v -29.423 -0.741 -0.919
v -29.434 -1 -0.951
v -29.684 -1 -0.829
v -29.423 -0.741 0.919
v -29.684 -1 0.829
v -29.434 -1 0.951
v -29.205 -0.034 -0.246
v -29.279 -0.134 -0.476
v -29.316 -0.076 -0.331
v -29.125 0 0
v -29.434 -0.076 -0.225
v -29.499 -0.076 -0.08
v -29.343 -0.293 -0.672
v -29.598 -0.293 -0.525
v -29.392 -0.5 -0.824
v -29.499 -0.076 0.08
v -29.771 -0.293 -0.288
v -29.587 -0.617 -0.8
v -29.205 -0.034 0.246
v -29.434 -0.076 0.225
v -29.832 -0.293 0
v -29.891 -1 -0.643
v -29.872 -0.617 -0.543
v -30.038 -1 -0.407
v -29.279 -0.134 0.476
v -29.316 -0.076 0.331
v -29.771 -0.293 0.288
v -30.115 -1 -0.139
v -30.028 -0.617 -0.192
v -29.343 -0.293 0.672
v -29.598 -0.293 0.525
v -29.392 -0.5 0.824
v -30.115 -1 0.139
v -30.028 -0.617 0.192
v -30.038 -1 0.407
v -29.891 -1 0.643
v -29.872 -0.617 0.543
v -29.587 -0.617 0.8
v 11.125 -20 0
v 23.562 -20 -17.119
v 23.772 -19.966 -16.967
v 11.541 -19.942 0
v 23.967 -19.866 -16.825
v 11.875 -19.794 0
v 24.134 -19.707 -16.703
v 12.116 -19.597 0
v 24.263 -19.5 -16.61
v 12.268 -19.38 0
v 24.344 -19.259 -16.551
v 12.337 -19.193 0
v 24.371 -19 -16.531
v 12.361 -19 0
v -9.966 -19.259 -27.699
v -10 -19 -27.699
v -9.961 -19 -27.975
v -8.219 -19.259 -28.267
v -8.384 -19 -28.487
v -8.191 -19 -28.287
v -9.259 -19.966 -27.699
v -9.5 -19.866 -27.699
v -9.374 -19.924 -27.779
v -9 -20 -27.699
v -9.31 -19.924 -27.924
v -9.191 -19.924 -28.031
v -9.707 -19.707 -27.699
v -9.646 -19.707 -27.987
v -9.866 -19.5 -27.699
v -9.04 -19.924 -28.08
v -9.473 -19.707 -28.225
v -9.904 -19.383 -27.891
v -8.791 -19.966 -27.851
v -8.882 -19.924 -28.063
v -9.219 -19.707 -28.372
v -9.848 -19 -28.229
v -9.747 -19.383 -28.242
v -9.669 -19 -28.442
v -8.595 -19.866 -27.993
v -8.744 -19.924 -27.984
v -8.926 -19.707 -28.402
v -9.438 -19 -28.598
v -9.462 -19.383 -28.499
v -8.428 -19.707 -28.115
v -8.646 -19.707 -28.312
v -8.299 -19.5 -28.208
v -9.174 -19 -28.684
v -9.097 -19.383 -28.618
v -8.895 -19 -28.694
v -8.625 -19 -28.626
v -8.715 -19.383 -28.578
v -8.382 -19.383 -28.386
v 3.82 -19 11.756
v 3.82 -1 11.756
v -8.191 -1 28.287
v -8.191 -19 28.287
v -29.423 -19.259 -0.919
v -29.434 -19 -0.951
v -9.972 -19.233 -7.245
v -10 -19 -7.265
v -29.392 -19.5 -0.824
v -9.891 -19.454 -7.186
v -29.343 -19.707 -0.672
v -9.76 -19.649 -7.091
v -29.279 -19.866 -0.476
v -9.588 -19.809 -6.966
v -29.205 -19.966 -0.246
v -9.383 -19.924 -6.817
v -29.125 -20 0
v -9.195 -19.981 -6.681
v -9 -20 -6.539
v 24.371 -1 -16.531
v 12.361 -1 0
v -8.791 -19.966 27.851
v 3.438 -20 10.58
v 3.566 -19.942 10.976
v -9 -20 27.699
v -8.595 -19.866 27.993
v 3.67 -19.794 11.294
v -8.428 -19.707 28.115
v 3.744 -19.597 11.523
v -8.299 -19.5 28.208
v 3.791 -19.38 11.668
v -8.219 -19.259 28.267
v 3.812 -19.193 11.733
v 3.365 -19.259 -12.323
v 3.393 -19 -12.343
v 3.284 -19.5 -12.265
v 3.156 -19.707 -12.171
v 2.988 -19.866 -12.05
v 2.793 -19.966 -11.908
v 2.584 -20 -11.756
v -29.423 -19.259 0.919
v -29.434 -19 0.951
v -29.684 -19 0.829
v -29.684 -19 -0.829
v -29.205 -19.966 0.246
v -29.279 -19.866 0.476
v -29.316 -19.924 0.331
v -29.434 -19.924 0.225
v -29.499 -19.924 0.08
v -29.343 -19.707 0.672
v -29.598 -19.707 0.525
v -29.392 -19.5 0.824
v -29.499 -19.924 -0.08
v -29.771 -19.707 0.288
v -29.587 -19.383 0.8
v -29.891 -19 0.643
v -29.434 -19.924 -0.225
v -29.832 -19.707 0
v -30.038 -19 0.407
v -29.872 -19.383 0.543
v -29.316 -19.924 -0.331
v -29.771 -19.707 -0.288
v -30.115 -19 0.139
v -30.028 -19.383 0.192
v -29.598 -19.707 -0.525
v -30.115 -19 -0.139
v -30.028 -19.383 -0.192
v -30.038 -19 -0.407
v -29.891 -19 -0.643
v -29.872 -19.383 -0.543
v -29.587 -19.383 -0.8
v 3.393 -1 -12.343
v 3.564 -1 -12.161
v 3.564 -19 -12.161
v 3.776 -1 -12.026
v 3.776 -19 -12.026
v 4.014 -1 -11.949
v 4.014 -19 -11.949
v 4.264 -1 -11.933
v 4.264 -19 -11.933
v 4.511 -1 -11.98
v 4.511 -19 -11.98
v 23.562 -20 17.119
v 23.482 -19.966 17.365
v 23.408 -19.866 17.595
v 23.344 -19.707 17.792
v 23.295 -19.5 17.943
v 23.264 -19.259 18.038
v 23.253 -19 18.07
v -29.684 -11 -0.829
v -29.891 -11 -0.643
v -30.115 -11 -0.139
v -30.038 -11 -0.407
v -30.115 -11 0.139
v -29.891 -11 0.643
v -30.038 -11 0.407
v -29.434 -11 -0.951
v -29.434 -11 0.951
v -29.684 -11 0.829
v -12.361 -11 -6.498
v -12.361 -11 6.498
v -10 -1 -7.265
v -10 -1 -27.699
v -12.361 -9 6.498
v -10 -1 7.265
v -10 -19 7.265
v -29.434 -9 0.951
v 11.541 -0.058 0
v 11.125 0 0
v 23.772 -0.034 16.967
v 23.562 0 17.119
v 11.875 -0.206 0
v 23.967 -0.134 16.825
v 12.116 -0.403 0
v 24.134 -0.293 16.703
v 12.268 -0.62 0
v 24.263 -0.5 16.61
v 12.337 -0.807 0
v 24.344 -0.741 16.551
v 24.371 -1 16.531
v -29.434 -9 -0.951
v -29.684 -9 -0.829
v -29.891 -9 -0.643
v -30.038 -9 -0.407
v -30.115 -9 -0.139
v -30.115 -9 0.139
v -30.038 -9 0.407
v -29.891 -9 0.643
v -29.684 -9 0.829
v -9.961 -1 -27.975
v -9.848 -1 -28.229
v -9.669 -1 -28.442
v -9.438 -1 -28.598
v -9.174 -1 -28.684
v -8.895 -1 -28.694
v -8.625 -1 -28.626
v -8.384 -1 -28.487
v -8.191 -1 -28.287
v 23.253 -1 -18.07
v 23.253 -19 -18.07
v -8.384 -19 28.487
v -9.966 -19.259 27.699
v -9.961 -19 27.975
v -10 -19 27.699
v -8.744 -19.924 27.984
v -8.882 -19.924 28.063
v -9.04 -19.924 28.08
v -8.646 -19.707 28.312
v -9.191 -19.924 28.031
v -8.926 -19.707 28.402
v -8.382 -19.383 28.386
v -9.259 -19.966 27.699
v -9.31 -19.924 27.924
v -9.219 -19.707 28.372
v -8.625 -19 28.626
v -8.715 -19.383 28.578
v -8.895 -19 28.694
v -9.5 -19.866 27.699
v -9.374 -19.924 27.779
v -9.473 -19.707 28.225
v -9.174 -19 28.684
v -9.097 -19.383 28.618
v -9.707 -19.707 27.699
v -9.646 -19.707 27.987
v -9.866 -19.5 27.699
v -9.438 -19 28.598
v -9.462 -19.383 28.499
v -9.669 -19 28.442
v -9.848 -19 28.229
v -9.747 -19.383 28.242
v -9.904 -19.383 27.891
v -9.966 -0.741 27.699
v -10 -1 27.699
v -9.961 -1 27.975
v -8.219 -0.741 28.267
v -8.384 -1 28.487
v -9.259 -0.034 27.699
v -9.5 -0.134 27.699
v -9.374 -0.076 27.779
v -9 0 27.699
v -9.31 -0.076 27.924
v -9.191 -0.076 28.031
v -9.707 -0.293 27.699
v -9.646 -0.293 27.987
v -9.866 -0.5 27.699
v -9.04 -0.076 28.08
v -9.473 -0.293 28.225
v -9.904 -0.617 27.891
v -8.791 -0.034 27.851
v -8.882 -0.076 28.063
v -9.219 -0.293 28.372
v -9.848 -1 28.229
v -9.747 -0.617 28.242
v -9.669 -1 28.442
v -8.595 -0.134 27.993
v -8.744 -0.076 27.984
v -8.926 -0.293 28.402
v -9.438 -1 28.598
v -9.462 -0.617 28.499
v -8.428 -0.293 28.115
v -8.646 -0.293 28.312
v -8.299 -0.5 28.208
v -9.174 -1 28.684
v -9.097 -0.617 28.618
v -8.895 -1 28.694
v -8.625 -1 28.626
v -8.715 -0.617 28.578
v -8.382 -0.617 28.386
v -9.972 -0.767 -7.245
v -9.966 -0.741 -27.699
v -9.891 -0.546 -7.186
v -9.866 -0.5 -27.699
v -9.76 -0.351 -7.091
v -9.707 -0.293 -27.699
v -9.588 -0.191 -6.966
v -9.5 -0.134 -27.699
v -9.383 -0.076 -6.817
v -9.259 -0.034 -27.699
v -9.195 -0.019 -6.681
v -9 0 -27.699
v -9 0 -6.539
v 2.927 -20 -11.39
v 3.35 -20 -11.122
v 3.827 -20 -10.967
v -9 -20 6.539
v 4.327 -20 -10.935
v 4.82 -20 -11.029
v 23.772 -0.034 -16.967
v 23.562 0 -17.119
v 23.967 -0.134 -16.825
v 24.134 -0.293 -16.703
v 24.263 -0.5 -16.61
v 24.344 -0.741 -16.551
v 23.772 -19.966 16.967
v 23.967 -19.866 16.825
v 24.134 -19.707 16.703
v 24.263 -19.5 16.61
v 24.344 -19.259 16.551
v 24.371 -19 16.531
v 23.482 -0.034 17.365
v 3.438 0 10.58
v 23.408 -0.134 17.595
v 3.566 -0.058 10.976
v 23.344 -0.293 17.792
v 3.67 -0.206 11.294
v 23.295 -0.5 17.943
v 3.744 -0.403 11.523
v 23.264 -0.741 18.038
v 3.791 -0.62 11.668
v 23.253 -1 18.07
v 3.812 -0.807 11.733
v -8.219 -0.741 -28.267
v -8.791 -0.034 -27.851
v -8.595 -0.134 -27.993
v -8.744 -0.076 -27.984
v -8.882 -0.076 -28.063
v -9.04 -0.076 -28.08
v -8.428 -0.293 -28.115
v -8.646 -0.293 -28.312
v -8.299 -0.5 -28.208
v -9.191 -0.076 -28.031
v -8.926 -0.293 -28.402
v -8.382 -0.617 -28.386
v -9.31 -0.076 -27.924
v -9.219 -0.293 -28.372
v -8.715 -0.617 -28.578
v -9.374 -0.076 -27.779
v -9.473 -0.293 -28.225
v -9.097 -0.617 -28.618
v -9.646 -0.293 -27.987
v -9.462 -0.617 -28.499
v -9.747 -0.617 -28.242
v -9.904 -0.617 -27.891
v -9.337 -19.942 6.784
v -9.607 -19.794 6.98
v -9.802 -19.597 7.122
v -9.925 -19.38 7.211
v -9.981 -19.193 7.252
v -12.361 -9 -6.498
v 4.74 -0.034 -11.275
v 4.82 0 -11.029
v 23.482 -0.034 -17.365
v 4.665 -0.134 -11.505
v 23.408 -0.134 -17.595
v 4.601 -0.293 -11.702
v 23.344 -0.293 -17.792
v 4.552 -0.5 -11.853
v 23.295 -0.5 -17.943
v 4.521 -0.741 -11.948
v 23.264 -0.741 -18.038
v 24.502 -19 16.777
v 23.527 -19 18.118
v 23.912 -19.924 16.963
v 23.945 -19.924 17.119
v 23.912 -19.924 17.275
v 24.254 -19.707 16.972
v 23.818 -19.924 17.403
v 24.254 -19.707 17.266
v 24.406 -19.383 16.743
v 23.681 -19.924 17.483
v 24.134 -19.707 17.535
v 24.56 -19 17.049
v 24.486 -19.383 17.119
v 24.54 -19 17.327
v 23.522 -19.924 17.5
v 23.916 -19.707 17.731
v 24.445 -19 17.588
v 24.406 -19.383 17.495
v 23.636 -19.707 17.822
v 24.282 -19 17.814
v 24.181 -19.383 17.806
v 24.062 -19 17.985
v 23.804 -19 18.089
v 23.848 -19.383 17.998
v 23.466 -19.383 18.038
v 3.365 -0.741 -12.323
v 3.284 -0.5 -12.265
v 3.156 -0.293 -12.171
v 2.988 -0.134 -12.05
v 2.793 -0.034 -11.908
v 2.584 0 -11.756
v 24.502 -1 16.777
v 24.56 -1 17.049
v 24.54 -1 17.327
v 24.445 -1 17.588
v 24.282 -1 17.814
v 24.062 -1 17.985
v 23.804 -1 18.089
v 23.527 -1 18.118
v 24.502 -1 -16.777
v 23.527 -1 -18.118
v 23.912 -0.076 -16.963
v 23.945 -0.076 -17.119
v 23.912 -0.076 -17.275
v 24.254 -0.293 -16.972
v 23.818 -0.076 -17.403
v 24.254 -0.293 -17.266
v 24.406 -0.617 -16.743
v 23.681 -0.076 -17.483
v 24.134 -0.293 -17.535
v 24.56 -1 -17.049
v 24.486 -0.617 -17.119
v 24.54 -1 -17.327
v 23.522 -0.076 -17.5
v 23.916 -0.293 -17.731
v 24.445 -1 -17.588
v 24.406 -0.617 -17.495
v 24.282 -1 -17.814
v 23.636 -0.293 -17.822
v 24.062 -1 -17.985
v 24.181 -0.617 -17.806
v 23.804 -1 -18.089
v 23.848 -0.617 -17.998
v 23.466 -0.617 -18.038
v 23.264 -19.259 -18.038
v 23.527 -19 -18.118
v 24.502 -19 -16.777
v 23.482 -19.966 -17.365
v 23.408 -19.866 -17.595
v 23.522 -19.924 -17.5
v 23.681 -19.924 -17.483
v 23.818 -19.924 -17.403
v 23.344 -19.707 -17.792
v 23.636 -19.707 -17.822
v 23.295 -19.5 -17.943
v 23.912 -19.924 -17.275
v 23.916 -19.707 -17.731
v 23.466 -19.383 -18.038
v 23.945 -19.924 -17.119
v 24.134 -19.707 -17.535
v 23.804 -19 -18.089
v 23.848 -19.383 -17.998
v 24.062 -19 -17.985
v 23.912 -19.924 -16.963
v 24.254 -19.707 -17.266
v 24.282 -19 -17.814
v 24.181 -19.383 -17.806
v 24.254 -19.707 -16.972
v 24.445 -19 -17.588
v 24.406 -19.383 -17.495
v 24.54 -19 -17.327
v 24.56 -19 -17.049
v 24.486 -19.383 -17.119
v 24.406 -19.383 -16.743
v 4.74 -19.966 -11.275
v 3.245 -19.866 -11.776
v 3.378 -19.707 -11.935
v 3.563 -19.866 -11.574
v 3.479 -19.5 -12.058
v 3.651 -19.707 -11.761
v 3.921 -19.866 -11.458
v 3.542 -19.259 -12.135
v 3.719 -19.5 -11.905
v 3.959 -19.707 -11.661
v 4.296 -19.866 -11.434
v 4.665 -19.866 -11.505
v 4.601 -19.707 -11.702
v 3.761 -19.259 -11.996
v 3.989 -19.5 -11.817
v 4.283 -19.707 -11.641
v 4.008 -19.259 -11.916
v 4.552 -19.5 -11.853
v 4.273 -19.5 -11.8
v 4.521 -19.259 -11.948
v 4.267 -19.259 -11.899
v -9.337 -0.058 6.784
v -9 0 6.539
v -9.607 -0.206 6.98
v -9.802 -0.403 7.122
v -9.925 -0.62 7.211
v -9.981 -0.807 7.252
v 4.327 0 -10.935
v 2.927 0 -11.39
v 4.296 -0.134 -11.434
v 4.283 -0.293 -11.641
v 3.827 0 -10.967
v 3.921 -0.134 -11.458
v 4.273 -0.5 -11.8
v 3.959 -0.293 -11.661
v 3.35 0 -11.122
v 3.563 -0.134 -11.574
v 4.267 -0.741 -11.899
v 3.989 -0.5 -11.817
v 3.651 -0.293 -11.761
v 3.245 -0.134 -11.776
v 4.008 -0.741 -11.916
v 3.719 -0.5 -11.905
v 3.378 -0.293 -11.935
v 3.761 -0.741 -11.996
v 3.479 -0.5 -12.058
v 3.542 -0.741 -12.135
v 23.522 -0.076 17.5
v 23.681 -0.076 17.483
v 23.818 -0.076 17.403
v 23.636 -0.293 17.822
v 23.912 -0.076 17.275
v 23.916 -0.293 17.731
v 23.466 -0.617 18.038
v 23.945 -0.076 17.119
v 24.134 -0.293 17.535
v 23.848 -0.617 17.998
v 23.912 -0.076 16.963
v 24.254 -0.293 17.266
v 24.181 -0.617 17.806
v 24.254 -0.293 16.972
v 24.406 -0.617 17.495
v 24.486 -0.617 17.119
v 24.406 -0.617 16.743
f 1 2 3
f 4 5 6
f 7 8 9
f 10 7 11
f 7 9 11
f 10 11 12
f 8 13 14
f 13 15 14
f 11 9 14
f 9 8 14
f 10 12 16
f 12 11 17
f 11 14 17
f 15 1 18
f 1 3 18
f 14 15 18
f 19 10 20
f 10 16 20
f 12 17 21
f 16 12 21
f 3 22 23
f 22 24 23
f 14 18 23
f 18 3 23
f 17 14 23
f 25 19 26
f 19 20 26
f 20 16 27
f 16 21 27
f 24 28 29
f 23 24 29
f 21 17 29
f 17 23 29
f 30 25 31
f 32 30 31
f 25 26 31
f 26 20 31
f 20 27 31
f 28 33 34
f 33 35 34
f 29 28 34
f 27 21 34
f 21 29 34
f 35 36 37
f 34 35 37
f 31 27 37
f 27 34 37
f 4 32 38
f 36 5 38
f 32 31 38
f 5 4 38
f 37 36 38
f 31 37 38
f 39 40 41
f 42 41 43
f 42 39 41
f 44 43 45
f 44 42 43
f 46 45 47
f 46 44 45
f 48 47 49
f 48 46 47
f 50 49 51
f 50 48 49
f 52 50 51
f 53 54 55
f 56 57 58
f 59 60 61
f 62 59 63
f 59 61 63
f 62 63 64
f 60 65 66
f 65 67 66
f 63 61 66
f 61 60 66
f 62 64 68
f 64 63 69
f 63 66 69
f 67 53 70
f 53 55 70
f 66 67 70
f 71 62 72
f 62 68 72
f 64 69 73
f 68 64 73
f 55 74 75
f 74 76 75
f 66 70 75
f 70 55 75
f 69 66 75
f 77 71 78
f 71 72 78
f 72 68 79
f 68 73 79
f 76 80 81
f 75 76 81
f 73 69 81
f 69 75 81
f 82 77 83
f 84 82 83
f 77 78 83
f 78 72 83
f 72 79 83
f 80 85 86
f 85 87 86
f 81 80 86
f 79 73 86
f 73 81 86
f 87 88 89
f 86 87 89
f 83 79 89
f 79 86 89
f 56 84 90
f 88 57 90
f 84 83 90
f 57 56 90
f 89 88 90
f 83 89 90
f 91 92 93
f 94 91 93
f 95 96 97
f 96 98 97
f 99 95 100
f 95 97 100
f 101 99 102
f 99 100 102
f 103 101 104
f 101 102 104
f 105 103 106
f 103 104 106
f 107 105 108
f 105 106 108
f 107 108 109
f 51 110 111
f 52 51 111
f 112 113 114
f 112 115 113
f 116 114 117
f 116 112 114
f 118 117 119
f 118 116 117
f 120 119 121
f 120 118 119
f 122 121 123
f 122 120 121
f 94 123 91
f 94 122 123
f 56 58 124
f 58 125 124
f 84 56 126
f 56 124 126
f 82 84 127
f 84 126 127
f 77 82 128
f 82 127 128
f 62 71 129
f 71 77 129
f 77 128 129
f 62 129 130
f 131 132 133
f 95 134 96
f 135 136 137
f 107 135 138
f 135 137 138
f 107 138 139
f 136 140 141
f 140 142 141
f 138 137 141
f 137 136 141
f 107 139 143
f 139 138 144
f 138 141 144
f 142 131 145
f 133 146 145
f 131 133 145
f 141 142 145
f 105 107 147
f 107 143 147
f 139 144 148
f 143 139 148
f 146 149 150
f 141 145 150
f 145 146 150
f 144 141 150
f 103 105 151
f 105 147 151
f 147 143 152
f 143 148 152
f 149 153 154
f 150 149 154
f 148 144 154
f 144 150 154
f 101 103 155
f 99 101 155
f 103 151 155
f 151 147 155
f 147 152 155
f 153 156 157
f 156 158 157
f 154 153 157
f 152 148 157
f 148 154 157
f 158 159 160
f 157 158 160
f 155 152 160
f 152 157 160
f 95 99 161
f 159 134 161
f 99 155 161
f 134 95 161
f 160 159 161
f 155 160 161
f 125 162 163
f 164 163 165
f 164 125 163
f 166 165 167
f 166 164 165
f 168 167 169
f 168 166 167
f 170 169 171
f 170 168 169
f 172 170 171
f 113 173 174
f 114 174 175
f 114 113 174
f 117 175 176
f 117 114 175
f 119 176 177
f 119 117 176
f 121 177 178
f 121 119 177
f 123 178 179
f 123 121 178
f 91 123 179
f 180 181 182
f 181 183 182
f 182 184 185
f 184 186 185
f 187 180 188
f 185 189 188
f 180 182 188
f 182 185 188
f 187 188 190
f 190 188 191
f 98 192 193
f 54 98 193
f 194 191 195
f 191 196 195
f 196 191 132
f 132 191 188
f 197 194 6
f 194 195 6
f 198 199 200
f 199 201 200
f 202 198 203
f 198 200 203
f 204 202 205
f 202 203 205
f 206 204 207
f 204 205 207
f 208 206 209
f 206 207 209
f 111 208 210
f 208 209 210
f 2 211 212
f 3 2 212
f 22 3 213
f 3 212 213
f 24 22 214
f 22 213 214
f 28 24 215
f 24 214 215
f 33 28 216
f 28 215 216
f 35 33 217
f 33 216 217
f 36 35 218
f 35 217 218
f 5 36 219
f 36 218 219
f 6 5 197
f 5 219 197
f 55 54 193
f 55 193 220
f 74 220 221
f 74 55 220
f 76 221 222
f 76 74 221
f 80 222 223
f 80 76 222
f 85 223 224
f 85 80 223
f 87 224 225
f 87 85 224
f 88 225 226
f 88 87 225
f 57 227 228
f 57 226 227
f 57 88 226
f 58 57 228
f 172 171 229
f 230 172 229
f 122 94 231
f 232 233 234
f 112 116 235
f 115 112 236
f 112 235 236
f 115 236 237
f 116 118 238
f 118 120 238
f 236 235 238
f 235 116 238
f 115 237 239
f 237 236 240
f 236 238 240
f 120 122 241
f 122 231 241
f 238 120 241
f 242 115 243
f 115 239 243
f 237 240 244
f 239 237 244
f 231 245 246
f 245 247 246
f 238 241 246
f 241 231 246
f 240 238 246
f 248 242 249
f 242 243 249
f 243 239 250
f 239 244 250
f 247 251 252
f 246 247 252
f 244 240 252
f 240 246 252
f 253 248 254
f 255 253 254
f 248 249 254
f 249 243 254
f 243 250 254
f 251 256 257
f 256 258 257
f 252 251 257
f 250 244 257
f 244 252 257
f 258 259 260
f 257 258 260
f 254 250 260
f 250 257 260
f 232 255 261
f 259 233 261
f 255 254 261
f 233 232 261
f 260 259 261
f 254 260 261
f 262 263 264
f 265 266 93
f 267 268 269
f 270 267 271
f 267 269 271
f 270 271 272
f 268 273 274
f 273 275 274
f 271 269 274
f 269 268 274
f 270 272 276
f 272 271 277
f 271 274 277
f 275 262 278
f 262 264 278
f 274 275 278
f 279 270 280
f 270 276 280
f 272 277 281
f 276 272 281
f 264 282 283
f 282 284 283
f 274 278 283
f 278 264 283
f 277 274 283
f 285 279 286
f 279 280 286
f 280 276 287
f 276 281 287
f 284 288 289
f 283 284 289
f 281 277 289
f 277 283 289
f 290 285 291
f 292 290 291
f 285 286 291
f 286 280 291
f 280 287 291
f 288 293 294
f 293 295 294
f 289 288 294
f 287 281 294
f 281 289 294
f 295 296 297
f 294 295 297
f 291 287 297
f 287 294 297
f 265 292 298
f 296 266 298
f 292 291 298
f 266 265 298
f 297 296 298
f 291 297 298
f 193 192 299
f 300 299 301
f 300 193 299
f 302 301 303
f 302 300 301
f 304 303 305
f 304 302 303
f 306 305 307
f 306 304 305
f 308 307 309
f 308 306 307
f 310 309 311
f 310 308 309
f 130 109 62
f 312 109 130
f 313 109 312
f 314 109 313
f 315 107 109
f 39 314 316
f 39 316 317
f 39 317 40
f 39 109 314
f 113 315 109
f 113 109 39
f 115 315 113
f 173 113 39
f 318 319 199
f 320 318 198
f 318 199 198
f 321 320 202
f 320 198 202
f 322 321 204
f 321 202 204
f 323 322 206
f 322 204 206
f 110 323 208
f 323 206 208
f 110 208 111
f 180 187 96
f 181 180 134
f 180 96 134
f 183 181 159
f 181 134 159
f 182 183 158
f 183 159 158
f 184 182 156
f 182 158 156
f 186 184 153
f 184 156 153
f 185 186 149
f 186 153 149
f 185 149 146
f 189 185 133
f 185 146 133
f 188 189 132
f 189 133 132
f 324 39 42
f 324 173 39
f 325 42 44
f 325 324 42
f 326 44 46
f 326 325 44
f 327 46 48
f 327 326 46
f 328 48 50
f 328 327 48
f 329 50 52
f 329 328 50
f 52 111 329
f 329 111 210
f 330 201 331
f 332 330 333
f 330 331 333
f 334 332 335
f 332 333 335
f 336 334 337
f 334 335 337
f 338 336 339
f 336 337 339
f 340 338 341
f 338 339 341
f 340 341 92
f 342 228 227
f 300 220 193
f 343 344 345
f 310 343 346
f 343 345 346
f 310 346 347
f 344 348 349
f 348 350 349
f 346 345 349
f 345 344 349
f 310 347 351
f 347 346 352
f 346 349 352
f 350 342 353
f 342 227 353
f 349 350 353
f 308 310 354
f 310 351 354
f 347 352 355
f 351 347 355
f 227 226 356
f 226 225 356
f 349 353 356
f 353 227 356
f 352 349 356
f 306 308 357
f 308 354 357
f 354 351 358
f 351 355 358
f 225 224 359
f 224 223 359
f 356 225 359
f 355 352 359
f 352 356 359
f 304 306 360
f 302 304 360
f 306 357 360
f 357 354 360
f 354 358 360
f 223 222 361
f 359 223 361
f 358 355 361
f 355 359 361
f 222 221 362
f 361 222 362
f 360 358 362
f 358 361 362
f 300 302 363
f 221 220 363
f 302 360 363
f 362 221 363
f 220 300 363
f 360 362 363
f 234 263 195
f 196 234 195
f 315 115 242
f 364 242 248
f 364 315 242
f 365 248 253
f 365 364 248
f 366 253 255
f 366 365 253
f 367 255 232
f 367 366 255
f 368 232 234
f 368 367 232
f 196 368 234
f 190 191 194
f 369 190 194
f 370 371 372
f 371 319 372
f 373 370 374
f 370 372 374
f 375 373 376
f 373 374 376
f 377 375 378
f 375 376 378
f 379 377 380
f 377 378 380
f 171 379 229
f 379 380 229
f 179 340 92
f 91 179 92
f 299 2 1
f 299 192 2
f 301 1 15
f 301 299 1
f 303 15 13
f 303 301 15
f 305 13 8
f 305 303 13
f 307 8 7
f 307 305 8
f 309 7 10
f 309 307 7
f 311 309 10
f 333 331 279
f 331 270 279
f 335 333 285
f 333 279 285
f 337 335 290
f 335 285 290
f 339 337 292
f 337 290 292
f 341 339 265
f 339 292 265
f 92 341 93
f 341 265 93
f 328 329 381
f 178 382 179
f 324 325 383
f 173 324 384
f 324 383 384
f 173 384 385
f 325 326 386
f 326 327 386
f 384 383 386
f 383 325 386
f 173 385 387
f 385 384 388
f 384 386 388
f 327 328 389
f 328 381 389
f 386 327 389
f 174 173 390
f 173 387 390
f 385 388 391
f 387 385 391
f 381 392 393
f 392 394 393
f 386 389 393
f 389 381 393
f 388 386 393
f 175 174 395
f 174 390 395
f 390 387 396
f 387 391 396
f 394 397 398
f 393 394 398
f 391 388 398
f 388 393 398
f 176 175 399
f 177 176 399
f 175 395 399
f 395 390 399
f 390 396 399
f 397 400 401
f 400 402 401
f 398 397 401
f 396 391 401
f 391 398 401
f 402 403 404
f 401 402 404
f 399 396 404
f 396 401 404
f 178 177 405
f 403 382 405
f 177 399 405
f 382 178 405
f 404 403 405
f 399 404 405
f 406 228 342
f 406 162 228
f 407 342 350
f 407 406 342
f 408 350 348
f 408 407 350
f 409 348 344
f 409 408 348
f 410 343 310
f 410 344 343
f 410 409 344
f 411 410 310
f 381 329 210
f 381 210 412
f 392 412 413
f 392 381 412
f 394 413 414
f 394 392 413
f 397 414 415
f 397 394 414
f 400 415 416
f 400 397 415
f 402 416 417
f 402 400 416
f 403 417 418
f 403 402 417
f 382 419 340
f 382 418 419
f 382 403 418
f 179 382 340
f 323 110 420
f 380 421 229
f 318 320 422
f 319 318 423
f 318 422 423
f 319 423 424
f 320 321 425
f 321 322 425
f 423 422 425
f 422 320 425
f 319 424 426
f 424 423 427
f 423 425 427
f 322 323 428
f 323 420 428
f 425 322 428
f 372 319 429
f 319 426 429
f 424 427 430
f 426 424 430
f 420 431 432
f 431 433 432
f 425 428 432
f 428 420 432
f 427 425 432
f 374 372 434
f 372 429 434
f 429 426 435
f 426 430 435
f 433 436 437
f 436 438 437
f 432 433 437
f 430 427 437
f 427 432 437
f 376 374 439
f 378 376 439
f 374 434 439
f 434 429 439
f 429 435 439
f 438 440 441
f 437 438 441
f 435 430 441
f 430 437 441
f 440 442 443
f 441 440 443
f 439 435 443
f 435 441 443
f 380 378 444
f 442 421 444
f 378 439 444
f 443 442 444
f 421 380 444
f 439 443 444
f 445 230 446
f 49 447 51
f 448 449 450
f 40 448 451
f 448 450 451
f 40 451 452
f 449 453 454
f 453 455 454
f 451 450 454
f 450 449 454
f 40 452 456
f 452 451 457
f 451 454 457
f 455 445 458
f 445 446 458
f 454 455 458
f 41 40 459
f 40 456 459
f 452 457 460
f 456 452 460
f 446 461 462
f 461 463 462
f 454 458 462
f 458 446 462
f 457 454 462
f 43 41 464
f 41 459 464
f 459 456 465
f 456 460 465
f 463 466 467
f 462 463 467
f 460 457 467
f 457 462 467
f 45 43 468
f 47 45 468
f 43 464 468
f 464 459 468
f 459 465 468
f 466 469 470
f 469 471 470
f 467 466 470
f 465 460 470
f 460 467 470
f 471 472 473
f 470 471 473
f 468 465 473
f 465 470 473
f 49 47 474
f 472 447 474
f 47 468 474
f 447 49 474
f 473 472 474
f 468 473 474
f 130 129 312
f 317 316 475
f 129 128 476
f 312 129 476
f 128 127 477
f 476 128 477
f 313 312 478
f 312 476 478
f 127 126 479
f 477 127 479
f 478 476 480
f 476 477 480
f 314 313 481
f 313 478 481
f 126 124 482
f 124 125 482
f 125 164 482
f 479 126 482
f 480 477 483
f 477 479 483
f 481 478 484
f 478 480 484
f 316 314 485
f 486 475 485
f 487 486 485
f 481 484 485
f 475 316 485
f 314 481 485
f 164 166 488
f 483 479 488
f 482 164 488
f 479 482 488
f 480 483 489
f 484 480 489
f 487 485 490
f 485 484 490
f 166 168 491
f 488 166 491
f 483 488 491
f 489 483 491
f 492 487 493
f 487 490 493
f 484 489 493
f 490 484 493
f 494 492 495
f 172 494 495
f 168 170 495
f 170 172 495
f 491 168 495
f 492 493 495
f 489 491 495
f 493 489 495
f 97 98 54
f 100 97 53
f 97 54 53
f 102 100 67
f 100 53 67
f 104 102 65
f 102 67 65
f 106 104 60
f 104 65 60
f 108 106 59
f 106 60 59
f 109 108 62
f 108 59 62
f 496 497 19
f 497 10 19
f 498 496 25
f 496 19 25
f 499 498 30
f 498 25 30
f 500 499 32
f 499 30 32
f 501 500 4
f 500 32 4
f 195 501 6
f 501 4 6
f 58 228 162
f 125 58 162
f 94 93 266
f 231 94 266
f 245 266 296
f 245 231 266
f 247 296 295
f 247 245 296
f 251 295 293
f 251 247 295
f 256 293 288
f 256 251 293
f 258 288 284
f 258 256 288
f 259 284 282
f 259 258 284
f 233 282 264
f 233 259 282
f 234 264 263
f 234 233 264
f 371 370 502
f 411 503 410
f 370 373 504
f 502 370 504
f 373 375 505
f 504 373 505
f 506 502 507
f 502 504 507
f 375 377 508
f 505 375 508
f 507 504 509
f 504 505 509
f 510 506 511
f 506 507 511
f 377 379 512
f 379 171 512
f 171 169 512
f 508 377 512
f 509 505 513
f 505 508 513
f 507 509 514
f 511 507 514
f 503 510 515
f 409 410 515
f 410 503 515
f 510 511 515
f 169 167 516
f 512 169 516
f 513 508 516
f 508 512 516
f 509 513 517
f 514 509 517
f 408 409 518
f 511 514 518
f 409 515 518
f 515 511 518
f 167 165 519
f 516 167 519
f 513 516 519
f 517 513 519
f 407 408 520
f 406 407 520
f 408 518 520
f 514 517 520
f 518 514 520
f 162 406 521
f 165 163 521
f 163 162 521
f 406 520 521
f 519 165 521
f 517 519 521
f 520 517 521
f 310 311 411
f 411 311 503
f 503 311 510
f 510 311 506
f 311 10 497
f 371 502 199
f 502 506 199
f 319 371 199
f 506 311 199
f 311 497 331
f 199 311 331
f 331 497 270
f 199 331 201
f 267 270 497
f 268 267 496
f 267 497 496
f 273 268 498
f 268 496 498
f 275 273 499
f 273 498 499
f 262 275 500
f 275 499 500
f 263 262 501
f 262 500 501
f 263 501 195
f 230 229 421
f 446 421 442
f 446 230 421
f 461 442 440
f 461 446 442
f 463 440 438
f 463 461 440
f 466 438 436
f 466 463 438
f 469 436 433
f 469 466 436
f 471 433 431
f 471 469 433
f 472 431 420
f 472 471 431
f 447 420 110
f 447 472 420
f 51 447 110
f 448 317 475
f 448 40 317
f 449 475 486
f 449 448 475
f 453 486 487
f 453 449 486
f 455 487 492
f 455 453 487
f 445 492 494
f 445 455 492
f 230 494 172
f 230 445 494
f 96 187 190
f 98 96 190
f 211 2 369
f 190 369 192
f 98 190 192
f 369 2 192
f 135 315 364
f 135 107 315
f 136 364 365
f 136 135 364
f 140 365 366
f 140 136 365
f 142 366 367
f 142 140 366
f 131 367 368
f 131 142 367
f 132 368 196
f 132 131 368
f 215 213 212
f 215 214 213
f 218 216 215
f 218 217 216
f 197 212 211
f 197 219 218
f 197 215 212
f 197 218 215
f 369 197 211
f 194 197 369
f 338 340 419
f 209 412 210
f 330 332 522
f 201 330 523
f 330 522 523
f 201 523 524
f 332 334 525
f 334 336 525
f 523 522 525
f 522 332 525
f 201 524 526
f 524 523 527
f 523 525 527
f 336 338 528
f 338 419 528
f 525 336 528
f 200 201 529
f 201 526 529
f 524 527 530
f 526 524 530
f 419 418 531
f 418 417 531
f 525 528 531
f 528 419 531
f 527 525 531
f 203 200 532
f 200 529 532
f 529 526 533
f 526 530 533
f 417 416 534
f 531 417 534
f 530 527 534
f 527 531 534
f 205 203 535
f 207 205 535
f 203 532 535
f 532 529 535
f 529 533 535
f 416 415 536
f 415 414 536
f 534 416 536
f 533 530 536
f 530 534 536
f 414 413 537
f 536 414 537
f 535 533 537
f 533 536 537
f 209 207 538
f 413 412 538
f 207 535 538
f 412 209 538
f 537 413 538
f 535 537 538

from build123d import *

# Parameters (mm, degrees)
F1_DEPTH = 20
F2_W     = 20
F2_H     = 2
F3_DEPTH = 12.5
F4_R     = 1


with BuildPart() as f1:
    # F0 (on Front) → F1 (new body)
    with BuildSketch(Plane.XZ):
        Polygon((-10, -7.265425), (-10, -30.776835), (3.81966, -11.755705), (26.18034, -19.02113), (12.36068, 0), (26.18034, 19.02113), (3.81966, 11.755705), (-10, 30.776835), (-10, 7.265425), (-32.36068, 0), align=None)
    extrude(amount=F1_DEPTH)

    # F2 (on Top) → F3 (cut, symmetric)
    with BuildSketch(Plane.XY):
        with Locations((-22.36068, -10)):
            Rectangle(F2_W, F2_H)
    extrude(amount=F3_DEPTH, both=True, mode=Mode.SUBTRACT)

    # F4
    f4_edges = [f1.edges().sort_by_distance(p)[0] for p in [
        (-21.18034, 0, -3.632713),
        (-21.18034, 0, 3.632713),
        (-10, 0, 19.02113),
        (-3.09017, 0, 21.26627),
        (15, 0, 15.388418),
        (19.27051, 0, 9.510565),
        (19.27051, 0, -9.510565),
        (15, 0, -15.388418),
        (-3.09017, 0, -21.26627),
        (-10, 0, -19.02113),
        (-21.18034, -20, 3.632713),
        (-21.18034, -20, -3.632713),
        (-10, -20, -19.02113),
        (-3.09017, -20, -21.26627),
        (15, -20, -15.388418),
        (19.27051, -20, -9.510565),
        (19.27051, -20, 9.510565),
        (15, -20, 15.388418),
        (-3.09017, -20, 21.26627),
        (-10, -20, 19.02113),
        (-10, -10, -30.776835),
        (3.81966, -10, -11.755705),
        (-32.36068, -15.5, 0),
        (-32.36068, -4.5, 0),
        (-10, -10, 30.776835),
        (26.18034, -10, 19.02113),
        (26.18034, -10, -19.02113),
    ]]
    fillet(f4_edges, radius=F4_R)


solid = f1.part
